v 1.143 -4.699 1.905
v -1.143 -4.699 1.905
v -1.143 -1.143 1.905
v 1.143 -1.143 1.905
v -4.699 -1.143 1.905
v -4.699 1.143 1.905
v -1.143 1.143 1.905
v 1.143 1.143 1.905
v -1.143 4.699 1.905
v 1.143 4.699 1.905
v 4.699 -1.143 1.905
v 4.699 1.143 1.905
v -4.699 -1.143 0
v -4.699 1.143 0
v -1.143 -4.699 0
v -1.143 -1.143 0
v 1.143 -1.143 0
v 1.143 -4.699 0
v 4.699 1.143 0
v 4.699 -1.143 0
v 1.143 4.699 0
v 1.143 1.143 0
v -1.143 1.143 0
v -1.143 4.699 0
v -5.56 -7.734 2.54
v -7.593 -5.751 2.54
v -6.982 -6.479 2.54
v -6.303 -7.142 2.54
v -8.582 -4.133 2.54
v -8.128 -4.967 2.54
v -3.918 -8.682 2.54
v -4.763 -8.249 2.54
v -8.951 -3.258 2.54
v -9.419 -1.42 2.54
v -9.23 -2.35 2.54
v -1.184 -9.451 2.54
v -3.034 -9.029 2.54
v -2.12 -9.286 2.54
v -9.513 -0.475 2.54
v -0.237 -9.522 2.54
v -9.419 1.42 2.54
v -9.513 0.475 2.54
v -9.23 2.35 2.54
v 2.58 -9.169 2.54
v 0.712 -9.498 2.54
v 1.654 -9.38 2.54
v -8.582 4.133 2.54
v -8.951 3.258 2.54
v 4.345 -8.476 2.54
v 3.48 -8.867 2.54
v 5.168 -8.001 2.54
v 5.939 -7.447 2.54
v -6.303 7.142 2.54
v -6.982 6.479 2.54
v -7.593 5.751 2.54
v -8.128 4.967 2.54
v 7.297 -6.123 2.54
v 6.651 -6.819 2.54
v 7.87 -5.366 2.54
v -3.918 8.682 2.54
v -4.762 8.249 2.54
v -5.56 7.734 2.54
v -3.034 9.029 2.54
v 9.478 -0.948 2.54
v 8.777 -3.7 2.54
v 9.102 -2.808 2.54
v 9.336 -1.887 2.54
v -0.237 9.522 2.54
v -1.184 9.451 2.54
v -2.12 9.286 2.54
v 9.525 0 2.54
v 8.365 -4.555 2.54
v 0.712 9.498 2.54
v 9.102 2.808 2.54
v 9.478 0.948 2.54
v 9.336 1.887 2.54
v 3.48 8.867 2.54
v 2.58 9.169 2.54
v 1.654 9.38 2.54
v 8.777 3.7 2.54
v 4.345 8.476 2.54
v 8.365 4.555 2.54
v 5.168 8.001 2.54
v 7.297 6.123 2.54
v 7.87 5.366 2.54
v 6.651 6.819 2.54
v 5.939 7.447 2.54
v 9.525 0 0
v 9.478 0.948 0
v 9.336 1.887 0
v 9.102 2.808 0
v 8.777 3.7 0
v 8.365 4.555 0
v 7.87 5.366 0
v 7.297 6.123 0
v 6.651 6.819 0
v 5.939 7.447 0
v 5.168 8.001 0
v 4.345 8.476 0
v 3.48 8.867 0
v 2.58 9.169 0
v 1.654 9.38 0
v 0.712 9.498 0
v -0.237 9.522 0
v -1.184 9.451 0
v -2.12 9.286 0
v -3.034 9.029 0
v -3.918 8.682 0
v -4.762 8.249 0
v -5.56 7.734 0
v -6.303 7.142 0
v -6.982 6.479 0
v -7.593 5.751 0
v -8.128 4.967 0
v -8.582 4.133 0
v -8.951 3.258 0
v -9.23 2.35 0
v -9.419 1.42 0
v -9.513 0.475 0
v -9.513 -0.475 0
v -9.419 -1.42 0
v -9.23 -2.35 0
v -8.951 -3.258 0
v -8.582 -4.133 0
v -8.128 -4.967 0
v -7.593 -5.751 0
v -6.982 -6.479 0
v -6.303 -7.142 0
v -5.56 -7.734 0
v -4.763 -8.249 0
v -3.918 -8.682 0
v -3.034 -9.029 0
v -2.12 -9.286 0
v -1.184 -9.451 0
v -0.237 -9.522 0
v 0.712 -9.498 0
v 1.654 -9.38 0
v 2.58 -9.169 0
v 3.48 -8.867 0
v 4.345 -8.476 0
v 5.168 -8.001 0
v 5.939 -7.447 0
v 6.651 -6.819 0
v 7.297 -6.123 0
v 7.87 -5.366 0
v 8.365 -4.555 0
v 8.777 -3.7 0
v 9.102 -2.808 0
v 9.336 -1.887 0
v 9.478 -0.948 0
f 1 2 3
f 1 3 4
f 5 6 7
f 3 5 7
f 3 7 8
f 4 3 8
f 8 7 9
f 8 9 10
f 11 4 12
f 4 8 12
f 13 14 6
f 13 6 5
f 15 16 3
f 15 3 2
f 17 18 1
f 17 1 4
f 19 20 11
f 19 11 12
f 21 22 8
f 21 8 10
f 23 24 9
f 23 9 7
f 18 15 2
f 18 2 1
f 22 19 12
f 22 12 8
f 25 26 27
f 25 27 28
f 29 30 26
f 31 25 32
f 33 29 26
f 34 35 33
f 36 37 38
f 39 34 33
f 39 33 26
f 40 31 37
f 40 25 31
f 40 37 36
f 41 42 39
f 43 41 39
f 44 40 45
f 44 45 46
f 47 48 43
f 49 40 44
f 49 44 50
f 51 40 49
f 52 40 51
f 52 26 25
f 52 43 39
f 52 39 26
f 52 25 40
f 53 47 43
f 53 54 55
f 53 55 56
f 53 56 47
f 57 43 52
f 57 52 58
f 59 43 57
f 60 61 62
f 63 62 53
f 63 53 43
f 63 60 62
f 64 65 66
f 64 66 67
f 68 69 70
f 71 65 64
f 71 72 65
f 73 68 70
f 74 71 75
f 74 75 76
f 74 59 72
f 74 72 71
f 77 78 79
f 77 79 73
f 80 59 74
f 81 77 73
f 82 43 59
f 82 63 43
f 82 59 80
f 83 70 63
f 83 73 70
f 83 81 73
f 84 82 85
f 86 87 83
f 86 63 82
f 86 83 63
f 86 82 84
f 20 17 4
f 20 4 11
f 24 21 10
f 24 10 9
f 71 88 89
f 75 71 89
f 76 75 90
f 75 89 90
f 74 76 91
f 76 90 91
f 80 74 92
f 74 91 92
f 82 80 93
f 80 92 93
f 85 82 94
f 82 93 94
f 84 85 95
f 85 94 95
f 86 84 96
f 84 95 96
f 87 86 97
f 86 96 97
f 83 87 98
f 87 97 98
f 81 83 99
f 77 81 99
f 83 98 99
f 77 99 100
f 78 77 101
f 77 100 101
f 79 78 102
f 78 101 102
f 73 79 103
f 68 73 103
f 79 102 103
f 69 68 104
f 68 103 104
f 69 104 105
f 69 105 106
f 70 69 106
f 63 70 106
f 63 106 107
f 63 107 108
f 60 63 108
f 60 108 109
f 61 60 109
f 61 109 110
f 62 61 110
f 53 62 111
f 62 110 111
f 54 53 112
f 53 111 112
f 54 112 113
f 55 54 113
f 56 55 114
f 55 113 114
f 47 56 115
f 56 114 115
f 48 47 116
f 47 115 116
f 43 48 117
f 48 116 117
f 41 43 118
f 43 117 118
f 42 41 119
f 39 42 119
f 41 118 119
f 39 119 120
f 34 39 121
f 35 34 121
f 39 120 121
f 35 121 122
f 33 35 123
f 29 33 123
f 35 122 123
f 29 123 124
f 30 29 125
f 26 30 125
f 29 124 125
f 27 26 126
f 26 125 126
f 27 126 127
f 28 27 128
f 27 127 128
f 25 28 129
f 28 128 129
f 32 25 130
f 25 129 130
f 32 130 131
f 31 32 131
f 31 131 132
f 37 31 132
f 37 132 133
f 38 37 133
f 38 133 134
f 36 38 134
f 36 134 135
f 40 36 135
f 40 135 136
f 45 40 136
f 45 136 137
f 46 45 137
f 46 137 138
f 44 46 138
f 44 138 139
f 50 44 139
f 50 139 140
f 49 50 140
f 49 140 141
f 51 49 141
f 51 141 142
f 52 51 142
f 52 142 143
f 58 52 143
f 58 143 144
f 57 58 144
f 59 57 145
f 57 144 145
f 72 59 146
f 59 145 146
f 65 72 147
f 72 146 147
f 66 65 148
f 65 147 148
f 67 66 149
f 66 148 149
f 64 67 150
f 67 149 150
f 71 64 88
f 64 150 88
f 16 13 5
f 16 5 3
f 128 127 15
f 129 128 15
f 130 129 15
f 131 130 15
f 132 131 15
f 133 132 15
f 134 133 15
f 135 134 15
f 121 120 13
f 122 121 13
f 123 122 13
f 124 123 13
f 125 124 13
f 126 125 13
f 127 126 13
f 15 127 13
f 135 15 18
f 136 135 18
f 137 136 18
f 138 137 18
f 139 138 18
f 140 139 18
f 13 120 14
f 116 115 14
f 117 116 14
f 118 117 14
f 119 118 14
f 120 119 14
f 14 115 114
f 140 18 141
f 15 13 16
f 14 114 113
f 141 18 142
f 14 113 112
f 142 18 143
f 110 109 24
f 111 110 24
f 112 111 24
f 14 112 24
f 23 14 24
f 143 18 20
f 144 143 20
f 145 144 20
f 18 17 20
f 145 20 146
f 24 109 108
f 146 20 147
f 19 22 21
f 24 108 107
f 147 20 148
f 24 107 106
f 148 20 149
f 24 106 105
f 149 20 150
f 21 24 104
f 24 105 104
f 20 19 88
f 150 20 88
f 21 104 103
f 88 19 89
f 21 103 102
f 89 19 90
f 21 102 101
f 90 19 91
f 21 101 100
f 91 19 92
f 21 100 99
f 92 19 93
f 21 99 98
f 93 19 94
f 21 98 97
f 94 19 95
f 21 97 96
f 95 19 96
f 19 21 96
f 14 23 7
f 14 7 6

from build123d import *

# Parameters (mm, degrees)
F0_R     = 9.525
F1_DEPTH = 2.54
F3_DEPTH = 1.905


with BuildPart() as f1:
    # F0 (on Top) → F1 (new body)
    with BuildSketch(Plane.XY):
        Circle(F0_R)
    extrude(amount=F1_DEPTH)

    # F2 (on Top) → F3 (cut)
    with BuildSketch(Plane.XY):
        Polygon((1.143, 4.699), (-1.143, 4.699), (-1.143, 1.143), (-4.699, 1.143), (-4.699, -1.143), (-1.143, -1.143), (-1.143, -4.699), (1.143, -4.699), (1.143, -1.143), (4.699, -1.143), (4.699, 1.143), (1.143, 1.143), align=None)
    extrude(amount=F3_DEPTH, mode=Mode.SUBTRACT)


solid = f1.part
